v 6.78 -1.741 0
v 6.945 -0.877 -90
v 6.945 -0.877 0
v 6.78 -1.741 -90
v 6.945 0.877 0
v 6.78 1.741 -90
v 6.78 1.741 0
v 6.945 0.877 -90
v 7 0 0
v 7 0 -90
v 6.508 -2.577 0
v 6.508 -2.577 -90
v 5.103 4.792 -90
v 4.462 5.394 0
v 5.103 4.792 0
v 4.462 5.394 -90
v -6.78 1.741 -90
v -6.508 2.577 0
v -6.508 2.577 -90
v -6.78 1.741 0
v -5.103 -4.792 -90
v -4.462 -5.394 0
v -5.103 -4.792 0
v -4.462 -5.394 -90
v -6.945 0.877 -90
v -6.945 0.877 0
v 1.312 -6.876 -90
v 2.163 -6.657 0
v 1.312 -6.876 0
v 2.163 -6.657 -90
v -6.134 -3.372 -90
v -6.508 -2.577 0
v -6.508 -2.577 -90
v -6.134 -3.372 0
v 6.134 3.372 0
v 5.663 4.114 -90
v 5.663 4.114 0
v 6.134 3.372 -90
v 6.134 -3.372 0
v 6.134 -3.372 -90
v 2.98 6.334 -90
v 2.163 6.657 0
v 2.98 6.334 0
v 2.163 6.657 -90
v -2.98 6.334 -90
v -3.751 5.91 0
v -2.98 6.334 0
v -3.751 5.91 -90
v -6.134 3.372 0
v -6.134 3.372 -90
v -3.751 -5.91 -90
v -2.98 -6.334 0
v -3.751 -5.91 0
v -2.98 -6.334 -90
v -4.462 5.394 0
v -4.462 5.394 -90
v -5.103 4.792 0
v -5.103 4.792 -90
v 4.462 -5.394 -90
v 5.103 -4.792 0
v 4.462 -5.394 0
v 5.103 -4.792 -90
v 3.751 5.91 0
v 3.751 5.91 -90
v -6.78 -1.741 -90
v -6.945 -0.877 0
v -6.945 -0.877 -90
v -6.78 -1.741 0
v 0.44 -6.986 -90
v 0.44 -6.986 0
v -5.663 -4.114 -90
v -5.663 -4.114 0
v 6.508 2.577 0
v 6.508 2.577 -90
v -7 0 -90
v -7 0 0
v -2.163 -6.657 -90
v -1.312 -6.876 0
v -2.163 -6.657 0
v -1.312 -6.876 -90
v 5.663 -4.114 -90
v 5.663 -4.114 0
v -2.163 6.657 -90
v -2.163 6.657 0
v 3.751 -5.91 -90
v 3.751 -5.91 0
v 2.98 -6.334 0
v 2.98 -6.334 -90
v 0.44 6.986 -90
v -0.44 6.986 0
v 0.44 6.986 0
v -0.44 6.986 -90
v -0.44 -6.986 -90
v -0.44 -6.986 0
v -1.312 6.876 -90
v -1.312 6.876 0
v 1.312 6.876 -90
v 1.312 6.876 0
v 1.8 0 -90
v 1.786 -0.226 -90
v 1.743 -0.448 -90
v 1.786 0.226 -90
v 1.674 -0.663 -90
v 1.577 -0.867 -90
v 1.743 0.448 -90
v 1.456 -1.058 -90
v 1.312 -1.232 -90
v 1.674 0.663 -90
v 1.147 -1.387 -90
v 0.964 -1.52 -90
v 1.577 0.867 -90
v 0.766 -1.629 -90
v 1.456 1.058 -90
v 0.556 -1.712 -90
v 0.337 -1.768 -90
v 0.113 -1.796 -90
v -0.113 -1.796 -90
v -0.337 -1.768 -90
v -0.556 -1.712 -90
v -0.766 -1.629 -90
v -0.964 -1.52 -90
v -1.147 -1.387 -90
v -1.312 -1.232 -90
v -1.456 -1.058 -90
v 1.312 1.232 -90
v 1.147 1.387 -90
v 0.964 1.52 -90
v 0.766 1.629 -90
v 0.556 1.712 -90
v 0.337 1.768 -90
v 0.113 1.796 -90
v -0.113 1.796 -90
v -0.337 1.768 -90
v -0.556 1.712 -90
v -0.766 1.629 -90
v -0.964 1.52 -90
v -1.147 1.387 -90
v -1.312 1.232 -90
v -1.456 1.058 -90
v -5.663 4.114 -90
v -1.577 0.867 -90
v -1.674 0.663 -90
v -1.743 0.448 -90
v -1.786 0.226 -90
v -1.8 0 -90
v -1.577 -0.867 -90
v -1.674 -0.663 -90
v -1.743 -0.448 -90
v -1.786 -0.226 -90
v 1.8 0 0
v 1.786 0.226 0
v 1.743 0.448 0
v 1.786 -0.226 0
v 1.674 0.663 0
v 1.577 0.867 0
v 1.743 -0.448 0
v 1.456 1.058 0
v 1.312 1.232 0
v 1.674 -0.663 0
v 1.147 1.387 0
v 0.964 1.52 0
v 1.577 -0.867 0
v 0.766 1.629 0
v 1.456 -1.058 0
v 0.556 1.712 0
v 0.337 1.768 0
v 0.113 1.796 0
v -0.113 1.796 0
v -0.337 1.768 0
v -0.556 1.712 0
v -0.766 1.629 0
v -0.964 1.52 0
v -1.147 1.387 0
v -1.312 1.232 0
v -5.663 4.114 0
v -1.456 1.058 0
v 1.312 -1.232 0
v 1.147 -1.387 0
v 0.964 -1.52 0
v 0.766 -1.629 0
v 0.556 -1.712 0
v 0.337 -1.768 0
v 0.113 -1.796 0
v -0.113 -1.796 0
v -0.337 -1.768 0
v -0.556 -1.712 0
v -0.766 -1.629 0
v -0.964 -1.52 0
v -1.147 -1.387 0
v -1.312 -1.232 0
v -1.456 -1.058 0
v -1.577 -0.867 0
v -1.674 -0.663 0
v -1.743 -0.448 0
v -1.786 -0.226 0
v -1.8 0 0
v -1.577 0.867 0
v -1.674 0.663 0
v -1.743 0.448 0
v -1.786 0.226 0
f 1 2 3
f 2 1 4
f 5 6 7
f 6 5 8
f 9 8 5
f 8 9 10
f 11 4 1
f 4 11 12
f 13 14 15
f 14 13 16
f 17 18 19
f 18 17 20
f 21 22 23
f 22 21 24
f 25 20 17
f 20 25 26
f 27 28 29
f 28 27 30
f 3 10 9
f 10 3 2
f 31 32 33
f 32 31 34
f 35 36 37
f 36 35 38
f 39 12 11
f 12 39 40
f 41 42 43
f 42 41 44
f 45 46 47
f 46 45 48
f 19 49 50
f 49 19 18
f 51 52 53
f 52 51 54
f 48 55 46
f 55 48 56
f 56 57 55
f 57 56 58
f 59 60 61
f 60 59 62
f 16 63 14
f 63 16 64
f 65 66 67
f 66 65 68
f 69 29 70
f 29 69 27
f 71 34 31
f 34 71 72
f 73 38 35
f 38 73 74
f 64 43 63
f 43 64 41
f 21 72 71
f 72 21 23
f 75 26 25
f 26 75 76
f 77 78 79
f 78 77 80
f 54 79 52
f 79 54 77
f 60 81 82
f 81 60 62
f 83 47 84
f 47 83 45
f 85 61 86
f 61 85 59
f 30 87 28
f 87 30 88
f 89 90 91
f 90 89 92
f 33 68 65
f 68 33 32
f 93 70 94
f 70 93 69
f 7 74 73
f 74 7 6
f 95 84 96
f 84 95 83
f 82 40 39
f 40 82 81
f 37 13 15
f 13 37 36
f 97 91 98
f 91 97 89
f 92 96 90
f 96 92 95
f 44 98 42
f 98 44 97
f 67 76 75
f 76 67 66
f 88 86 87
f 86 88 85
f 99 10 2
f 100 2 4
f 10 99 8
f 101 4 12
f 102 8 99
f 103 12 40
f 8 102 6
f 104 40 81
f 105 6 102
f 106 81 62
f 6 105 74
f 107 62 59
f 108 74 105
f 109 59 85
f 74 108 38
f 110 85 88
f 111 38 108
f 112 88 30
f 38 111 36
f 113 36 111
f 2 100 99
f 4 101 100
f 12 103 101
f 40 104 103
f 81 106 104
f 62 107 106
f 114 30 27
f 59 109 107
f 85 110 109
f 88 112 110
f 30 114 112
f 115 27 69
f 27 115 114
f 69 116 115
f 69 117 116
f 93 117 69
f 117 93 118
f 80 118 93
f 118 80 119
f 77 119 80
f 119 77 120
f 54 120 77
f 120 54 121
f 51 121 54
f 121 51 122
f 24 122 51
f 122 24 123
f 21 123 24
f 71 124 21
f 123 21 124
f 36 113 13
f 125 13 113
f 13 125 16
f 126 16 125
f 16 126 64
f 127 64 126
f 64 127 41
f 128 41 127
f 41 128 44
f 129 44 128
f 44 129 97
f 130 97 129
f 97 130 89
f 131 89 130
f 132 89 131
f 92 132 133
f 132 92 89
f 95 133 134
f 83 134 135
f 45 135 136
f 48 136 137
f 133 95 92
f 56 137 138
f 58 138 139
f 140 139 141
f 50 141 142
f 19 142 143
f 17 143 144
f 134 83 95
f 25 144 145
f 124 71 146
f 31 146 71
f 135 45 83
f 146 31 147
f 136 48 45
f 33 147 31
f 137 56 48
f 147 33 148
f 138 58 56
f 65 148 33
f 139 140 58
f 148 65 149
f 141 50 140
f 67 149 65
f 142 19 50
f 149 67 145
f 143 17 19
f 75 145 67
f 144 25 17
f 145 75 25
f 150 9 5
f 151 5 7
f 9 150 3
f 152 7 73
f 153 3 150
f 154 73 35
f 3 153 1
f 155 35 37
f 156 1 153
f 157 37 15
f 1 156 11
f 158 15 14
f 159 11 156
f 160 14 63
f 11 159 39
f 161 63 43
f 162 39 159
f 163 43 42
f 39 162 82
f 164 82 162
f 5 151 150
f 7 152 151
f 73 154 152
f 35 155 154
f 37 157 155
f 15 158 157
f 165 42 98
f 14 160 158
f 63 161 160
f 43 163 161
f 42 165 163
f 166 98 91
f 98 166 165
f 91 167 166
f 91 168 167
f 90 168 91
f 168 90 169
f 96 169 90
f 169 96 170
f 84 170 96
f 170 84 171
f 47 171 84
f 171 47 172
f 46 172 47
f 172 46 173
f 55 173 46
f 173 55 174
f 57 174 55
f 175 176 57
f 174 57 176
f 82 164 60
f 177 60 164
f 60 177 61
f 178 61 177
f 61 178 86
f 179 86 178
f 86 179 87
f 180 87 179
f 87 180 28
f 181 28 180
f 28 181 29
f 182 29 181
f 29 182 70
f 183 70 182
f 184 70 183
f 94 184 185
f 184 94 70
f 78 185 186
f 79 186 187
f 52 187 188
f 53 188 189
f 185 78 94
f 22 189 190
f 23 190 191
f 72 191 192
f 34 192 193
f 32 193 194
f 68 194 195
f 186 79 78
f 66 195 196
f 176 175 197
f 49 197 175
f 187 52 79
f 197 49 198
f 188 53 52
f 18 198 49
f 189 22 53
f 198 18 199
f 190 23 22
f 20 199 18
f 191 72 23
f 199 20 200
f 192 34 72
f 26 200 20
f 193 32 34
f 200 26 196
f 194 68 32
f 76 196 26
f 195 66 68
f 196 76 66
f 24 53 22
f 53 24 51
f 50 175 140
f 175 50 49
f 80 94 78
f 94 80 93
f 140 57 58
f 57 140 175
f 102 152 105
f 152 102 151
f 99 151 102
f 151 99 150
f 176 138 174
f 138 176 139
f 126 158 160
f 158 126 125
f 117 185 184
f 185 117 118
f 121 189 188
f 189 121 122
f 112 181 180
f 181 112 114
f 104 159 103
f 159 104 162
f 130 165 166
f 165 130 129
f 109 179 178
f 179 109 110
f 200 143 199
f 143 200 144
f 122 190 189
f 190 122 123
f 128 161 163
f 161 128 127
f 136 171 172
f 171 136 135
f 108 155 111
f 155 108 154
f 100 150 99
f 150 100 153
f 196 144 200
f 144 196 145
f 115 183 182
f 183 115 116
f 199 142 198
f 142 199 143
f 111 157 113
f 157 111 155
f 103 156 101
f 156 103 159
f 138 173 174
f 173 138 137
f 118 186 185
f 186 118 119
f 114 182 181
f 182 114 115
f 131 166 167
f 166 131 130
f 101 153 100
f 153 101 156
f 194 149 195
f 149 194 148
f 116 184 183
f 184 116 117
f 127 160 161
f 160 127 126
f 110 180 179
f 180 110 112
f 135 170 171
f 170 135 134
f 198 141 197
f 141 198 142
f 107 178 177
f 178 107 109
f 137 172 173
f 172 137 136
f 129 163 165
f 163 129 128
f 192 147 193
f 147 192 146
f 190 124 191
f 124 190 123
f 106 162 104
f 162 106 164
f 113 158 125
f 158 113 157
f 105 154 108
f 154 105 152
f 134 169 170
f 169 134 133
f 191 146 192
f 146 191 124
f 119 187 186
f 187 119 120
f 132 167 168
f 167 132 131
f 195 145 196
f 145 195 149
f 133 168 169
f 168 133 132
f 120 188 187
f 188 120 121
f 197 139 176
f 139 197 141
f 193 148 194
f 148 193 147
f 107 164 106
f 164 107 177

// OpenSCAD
$fn = 50;


difference() {
	union() {
		translate(v = [0, 0, -90.0000000000]) {
			cylinder(h = 90, r = 7.0000000000);
		}
		cylinder(h = 0, r = 17.0000000000);
	}
	union() {
		#translate(v = [0, 0, -90]) {
			cylinder(h = 90, r = 1.8000000000);
		}
	}
}
